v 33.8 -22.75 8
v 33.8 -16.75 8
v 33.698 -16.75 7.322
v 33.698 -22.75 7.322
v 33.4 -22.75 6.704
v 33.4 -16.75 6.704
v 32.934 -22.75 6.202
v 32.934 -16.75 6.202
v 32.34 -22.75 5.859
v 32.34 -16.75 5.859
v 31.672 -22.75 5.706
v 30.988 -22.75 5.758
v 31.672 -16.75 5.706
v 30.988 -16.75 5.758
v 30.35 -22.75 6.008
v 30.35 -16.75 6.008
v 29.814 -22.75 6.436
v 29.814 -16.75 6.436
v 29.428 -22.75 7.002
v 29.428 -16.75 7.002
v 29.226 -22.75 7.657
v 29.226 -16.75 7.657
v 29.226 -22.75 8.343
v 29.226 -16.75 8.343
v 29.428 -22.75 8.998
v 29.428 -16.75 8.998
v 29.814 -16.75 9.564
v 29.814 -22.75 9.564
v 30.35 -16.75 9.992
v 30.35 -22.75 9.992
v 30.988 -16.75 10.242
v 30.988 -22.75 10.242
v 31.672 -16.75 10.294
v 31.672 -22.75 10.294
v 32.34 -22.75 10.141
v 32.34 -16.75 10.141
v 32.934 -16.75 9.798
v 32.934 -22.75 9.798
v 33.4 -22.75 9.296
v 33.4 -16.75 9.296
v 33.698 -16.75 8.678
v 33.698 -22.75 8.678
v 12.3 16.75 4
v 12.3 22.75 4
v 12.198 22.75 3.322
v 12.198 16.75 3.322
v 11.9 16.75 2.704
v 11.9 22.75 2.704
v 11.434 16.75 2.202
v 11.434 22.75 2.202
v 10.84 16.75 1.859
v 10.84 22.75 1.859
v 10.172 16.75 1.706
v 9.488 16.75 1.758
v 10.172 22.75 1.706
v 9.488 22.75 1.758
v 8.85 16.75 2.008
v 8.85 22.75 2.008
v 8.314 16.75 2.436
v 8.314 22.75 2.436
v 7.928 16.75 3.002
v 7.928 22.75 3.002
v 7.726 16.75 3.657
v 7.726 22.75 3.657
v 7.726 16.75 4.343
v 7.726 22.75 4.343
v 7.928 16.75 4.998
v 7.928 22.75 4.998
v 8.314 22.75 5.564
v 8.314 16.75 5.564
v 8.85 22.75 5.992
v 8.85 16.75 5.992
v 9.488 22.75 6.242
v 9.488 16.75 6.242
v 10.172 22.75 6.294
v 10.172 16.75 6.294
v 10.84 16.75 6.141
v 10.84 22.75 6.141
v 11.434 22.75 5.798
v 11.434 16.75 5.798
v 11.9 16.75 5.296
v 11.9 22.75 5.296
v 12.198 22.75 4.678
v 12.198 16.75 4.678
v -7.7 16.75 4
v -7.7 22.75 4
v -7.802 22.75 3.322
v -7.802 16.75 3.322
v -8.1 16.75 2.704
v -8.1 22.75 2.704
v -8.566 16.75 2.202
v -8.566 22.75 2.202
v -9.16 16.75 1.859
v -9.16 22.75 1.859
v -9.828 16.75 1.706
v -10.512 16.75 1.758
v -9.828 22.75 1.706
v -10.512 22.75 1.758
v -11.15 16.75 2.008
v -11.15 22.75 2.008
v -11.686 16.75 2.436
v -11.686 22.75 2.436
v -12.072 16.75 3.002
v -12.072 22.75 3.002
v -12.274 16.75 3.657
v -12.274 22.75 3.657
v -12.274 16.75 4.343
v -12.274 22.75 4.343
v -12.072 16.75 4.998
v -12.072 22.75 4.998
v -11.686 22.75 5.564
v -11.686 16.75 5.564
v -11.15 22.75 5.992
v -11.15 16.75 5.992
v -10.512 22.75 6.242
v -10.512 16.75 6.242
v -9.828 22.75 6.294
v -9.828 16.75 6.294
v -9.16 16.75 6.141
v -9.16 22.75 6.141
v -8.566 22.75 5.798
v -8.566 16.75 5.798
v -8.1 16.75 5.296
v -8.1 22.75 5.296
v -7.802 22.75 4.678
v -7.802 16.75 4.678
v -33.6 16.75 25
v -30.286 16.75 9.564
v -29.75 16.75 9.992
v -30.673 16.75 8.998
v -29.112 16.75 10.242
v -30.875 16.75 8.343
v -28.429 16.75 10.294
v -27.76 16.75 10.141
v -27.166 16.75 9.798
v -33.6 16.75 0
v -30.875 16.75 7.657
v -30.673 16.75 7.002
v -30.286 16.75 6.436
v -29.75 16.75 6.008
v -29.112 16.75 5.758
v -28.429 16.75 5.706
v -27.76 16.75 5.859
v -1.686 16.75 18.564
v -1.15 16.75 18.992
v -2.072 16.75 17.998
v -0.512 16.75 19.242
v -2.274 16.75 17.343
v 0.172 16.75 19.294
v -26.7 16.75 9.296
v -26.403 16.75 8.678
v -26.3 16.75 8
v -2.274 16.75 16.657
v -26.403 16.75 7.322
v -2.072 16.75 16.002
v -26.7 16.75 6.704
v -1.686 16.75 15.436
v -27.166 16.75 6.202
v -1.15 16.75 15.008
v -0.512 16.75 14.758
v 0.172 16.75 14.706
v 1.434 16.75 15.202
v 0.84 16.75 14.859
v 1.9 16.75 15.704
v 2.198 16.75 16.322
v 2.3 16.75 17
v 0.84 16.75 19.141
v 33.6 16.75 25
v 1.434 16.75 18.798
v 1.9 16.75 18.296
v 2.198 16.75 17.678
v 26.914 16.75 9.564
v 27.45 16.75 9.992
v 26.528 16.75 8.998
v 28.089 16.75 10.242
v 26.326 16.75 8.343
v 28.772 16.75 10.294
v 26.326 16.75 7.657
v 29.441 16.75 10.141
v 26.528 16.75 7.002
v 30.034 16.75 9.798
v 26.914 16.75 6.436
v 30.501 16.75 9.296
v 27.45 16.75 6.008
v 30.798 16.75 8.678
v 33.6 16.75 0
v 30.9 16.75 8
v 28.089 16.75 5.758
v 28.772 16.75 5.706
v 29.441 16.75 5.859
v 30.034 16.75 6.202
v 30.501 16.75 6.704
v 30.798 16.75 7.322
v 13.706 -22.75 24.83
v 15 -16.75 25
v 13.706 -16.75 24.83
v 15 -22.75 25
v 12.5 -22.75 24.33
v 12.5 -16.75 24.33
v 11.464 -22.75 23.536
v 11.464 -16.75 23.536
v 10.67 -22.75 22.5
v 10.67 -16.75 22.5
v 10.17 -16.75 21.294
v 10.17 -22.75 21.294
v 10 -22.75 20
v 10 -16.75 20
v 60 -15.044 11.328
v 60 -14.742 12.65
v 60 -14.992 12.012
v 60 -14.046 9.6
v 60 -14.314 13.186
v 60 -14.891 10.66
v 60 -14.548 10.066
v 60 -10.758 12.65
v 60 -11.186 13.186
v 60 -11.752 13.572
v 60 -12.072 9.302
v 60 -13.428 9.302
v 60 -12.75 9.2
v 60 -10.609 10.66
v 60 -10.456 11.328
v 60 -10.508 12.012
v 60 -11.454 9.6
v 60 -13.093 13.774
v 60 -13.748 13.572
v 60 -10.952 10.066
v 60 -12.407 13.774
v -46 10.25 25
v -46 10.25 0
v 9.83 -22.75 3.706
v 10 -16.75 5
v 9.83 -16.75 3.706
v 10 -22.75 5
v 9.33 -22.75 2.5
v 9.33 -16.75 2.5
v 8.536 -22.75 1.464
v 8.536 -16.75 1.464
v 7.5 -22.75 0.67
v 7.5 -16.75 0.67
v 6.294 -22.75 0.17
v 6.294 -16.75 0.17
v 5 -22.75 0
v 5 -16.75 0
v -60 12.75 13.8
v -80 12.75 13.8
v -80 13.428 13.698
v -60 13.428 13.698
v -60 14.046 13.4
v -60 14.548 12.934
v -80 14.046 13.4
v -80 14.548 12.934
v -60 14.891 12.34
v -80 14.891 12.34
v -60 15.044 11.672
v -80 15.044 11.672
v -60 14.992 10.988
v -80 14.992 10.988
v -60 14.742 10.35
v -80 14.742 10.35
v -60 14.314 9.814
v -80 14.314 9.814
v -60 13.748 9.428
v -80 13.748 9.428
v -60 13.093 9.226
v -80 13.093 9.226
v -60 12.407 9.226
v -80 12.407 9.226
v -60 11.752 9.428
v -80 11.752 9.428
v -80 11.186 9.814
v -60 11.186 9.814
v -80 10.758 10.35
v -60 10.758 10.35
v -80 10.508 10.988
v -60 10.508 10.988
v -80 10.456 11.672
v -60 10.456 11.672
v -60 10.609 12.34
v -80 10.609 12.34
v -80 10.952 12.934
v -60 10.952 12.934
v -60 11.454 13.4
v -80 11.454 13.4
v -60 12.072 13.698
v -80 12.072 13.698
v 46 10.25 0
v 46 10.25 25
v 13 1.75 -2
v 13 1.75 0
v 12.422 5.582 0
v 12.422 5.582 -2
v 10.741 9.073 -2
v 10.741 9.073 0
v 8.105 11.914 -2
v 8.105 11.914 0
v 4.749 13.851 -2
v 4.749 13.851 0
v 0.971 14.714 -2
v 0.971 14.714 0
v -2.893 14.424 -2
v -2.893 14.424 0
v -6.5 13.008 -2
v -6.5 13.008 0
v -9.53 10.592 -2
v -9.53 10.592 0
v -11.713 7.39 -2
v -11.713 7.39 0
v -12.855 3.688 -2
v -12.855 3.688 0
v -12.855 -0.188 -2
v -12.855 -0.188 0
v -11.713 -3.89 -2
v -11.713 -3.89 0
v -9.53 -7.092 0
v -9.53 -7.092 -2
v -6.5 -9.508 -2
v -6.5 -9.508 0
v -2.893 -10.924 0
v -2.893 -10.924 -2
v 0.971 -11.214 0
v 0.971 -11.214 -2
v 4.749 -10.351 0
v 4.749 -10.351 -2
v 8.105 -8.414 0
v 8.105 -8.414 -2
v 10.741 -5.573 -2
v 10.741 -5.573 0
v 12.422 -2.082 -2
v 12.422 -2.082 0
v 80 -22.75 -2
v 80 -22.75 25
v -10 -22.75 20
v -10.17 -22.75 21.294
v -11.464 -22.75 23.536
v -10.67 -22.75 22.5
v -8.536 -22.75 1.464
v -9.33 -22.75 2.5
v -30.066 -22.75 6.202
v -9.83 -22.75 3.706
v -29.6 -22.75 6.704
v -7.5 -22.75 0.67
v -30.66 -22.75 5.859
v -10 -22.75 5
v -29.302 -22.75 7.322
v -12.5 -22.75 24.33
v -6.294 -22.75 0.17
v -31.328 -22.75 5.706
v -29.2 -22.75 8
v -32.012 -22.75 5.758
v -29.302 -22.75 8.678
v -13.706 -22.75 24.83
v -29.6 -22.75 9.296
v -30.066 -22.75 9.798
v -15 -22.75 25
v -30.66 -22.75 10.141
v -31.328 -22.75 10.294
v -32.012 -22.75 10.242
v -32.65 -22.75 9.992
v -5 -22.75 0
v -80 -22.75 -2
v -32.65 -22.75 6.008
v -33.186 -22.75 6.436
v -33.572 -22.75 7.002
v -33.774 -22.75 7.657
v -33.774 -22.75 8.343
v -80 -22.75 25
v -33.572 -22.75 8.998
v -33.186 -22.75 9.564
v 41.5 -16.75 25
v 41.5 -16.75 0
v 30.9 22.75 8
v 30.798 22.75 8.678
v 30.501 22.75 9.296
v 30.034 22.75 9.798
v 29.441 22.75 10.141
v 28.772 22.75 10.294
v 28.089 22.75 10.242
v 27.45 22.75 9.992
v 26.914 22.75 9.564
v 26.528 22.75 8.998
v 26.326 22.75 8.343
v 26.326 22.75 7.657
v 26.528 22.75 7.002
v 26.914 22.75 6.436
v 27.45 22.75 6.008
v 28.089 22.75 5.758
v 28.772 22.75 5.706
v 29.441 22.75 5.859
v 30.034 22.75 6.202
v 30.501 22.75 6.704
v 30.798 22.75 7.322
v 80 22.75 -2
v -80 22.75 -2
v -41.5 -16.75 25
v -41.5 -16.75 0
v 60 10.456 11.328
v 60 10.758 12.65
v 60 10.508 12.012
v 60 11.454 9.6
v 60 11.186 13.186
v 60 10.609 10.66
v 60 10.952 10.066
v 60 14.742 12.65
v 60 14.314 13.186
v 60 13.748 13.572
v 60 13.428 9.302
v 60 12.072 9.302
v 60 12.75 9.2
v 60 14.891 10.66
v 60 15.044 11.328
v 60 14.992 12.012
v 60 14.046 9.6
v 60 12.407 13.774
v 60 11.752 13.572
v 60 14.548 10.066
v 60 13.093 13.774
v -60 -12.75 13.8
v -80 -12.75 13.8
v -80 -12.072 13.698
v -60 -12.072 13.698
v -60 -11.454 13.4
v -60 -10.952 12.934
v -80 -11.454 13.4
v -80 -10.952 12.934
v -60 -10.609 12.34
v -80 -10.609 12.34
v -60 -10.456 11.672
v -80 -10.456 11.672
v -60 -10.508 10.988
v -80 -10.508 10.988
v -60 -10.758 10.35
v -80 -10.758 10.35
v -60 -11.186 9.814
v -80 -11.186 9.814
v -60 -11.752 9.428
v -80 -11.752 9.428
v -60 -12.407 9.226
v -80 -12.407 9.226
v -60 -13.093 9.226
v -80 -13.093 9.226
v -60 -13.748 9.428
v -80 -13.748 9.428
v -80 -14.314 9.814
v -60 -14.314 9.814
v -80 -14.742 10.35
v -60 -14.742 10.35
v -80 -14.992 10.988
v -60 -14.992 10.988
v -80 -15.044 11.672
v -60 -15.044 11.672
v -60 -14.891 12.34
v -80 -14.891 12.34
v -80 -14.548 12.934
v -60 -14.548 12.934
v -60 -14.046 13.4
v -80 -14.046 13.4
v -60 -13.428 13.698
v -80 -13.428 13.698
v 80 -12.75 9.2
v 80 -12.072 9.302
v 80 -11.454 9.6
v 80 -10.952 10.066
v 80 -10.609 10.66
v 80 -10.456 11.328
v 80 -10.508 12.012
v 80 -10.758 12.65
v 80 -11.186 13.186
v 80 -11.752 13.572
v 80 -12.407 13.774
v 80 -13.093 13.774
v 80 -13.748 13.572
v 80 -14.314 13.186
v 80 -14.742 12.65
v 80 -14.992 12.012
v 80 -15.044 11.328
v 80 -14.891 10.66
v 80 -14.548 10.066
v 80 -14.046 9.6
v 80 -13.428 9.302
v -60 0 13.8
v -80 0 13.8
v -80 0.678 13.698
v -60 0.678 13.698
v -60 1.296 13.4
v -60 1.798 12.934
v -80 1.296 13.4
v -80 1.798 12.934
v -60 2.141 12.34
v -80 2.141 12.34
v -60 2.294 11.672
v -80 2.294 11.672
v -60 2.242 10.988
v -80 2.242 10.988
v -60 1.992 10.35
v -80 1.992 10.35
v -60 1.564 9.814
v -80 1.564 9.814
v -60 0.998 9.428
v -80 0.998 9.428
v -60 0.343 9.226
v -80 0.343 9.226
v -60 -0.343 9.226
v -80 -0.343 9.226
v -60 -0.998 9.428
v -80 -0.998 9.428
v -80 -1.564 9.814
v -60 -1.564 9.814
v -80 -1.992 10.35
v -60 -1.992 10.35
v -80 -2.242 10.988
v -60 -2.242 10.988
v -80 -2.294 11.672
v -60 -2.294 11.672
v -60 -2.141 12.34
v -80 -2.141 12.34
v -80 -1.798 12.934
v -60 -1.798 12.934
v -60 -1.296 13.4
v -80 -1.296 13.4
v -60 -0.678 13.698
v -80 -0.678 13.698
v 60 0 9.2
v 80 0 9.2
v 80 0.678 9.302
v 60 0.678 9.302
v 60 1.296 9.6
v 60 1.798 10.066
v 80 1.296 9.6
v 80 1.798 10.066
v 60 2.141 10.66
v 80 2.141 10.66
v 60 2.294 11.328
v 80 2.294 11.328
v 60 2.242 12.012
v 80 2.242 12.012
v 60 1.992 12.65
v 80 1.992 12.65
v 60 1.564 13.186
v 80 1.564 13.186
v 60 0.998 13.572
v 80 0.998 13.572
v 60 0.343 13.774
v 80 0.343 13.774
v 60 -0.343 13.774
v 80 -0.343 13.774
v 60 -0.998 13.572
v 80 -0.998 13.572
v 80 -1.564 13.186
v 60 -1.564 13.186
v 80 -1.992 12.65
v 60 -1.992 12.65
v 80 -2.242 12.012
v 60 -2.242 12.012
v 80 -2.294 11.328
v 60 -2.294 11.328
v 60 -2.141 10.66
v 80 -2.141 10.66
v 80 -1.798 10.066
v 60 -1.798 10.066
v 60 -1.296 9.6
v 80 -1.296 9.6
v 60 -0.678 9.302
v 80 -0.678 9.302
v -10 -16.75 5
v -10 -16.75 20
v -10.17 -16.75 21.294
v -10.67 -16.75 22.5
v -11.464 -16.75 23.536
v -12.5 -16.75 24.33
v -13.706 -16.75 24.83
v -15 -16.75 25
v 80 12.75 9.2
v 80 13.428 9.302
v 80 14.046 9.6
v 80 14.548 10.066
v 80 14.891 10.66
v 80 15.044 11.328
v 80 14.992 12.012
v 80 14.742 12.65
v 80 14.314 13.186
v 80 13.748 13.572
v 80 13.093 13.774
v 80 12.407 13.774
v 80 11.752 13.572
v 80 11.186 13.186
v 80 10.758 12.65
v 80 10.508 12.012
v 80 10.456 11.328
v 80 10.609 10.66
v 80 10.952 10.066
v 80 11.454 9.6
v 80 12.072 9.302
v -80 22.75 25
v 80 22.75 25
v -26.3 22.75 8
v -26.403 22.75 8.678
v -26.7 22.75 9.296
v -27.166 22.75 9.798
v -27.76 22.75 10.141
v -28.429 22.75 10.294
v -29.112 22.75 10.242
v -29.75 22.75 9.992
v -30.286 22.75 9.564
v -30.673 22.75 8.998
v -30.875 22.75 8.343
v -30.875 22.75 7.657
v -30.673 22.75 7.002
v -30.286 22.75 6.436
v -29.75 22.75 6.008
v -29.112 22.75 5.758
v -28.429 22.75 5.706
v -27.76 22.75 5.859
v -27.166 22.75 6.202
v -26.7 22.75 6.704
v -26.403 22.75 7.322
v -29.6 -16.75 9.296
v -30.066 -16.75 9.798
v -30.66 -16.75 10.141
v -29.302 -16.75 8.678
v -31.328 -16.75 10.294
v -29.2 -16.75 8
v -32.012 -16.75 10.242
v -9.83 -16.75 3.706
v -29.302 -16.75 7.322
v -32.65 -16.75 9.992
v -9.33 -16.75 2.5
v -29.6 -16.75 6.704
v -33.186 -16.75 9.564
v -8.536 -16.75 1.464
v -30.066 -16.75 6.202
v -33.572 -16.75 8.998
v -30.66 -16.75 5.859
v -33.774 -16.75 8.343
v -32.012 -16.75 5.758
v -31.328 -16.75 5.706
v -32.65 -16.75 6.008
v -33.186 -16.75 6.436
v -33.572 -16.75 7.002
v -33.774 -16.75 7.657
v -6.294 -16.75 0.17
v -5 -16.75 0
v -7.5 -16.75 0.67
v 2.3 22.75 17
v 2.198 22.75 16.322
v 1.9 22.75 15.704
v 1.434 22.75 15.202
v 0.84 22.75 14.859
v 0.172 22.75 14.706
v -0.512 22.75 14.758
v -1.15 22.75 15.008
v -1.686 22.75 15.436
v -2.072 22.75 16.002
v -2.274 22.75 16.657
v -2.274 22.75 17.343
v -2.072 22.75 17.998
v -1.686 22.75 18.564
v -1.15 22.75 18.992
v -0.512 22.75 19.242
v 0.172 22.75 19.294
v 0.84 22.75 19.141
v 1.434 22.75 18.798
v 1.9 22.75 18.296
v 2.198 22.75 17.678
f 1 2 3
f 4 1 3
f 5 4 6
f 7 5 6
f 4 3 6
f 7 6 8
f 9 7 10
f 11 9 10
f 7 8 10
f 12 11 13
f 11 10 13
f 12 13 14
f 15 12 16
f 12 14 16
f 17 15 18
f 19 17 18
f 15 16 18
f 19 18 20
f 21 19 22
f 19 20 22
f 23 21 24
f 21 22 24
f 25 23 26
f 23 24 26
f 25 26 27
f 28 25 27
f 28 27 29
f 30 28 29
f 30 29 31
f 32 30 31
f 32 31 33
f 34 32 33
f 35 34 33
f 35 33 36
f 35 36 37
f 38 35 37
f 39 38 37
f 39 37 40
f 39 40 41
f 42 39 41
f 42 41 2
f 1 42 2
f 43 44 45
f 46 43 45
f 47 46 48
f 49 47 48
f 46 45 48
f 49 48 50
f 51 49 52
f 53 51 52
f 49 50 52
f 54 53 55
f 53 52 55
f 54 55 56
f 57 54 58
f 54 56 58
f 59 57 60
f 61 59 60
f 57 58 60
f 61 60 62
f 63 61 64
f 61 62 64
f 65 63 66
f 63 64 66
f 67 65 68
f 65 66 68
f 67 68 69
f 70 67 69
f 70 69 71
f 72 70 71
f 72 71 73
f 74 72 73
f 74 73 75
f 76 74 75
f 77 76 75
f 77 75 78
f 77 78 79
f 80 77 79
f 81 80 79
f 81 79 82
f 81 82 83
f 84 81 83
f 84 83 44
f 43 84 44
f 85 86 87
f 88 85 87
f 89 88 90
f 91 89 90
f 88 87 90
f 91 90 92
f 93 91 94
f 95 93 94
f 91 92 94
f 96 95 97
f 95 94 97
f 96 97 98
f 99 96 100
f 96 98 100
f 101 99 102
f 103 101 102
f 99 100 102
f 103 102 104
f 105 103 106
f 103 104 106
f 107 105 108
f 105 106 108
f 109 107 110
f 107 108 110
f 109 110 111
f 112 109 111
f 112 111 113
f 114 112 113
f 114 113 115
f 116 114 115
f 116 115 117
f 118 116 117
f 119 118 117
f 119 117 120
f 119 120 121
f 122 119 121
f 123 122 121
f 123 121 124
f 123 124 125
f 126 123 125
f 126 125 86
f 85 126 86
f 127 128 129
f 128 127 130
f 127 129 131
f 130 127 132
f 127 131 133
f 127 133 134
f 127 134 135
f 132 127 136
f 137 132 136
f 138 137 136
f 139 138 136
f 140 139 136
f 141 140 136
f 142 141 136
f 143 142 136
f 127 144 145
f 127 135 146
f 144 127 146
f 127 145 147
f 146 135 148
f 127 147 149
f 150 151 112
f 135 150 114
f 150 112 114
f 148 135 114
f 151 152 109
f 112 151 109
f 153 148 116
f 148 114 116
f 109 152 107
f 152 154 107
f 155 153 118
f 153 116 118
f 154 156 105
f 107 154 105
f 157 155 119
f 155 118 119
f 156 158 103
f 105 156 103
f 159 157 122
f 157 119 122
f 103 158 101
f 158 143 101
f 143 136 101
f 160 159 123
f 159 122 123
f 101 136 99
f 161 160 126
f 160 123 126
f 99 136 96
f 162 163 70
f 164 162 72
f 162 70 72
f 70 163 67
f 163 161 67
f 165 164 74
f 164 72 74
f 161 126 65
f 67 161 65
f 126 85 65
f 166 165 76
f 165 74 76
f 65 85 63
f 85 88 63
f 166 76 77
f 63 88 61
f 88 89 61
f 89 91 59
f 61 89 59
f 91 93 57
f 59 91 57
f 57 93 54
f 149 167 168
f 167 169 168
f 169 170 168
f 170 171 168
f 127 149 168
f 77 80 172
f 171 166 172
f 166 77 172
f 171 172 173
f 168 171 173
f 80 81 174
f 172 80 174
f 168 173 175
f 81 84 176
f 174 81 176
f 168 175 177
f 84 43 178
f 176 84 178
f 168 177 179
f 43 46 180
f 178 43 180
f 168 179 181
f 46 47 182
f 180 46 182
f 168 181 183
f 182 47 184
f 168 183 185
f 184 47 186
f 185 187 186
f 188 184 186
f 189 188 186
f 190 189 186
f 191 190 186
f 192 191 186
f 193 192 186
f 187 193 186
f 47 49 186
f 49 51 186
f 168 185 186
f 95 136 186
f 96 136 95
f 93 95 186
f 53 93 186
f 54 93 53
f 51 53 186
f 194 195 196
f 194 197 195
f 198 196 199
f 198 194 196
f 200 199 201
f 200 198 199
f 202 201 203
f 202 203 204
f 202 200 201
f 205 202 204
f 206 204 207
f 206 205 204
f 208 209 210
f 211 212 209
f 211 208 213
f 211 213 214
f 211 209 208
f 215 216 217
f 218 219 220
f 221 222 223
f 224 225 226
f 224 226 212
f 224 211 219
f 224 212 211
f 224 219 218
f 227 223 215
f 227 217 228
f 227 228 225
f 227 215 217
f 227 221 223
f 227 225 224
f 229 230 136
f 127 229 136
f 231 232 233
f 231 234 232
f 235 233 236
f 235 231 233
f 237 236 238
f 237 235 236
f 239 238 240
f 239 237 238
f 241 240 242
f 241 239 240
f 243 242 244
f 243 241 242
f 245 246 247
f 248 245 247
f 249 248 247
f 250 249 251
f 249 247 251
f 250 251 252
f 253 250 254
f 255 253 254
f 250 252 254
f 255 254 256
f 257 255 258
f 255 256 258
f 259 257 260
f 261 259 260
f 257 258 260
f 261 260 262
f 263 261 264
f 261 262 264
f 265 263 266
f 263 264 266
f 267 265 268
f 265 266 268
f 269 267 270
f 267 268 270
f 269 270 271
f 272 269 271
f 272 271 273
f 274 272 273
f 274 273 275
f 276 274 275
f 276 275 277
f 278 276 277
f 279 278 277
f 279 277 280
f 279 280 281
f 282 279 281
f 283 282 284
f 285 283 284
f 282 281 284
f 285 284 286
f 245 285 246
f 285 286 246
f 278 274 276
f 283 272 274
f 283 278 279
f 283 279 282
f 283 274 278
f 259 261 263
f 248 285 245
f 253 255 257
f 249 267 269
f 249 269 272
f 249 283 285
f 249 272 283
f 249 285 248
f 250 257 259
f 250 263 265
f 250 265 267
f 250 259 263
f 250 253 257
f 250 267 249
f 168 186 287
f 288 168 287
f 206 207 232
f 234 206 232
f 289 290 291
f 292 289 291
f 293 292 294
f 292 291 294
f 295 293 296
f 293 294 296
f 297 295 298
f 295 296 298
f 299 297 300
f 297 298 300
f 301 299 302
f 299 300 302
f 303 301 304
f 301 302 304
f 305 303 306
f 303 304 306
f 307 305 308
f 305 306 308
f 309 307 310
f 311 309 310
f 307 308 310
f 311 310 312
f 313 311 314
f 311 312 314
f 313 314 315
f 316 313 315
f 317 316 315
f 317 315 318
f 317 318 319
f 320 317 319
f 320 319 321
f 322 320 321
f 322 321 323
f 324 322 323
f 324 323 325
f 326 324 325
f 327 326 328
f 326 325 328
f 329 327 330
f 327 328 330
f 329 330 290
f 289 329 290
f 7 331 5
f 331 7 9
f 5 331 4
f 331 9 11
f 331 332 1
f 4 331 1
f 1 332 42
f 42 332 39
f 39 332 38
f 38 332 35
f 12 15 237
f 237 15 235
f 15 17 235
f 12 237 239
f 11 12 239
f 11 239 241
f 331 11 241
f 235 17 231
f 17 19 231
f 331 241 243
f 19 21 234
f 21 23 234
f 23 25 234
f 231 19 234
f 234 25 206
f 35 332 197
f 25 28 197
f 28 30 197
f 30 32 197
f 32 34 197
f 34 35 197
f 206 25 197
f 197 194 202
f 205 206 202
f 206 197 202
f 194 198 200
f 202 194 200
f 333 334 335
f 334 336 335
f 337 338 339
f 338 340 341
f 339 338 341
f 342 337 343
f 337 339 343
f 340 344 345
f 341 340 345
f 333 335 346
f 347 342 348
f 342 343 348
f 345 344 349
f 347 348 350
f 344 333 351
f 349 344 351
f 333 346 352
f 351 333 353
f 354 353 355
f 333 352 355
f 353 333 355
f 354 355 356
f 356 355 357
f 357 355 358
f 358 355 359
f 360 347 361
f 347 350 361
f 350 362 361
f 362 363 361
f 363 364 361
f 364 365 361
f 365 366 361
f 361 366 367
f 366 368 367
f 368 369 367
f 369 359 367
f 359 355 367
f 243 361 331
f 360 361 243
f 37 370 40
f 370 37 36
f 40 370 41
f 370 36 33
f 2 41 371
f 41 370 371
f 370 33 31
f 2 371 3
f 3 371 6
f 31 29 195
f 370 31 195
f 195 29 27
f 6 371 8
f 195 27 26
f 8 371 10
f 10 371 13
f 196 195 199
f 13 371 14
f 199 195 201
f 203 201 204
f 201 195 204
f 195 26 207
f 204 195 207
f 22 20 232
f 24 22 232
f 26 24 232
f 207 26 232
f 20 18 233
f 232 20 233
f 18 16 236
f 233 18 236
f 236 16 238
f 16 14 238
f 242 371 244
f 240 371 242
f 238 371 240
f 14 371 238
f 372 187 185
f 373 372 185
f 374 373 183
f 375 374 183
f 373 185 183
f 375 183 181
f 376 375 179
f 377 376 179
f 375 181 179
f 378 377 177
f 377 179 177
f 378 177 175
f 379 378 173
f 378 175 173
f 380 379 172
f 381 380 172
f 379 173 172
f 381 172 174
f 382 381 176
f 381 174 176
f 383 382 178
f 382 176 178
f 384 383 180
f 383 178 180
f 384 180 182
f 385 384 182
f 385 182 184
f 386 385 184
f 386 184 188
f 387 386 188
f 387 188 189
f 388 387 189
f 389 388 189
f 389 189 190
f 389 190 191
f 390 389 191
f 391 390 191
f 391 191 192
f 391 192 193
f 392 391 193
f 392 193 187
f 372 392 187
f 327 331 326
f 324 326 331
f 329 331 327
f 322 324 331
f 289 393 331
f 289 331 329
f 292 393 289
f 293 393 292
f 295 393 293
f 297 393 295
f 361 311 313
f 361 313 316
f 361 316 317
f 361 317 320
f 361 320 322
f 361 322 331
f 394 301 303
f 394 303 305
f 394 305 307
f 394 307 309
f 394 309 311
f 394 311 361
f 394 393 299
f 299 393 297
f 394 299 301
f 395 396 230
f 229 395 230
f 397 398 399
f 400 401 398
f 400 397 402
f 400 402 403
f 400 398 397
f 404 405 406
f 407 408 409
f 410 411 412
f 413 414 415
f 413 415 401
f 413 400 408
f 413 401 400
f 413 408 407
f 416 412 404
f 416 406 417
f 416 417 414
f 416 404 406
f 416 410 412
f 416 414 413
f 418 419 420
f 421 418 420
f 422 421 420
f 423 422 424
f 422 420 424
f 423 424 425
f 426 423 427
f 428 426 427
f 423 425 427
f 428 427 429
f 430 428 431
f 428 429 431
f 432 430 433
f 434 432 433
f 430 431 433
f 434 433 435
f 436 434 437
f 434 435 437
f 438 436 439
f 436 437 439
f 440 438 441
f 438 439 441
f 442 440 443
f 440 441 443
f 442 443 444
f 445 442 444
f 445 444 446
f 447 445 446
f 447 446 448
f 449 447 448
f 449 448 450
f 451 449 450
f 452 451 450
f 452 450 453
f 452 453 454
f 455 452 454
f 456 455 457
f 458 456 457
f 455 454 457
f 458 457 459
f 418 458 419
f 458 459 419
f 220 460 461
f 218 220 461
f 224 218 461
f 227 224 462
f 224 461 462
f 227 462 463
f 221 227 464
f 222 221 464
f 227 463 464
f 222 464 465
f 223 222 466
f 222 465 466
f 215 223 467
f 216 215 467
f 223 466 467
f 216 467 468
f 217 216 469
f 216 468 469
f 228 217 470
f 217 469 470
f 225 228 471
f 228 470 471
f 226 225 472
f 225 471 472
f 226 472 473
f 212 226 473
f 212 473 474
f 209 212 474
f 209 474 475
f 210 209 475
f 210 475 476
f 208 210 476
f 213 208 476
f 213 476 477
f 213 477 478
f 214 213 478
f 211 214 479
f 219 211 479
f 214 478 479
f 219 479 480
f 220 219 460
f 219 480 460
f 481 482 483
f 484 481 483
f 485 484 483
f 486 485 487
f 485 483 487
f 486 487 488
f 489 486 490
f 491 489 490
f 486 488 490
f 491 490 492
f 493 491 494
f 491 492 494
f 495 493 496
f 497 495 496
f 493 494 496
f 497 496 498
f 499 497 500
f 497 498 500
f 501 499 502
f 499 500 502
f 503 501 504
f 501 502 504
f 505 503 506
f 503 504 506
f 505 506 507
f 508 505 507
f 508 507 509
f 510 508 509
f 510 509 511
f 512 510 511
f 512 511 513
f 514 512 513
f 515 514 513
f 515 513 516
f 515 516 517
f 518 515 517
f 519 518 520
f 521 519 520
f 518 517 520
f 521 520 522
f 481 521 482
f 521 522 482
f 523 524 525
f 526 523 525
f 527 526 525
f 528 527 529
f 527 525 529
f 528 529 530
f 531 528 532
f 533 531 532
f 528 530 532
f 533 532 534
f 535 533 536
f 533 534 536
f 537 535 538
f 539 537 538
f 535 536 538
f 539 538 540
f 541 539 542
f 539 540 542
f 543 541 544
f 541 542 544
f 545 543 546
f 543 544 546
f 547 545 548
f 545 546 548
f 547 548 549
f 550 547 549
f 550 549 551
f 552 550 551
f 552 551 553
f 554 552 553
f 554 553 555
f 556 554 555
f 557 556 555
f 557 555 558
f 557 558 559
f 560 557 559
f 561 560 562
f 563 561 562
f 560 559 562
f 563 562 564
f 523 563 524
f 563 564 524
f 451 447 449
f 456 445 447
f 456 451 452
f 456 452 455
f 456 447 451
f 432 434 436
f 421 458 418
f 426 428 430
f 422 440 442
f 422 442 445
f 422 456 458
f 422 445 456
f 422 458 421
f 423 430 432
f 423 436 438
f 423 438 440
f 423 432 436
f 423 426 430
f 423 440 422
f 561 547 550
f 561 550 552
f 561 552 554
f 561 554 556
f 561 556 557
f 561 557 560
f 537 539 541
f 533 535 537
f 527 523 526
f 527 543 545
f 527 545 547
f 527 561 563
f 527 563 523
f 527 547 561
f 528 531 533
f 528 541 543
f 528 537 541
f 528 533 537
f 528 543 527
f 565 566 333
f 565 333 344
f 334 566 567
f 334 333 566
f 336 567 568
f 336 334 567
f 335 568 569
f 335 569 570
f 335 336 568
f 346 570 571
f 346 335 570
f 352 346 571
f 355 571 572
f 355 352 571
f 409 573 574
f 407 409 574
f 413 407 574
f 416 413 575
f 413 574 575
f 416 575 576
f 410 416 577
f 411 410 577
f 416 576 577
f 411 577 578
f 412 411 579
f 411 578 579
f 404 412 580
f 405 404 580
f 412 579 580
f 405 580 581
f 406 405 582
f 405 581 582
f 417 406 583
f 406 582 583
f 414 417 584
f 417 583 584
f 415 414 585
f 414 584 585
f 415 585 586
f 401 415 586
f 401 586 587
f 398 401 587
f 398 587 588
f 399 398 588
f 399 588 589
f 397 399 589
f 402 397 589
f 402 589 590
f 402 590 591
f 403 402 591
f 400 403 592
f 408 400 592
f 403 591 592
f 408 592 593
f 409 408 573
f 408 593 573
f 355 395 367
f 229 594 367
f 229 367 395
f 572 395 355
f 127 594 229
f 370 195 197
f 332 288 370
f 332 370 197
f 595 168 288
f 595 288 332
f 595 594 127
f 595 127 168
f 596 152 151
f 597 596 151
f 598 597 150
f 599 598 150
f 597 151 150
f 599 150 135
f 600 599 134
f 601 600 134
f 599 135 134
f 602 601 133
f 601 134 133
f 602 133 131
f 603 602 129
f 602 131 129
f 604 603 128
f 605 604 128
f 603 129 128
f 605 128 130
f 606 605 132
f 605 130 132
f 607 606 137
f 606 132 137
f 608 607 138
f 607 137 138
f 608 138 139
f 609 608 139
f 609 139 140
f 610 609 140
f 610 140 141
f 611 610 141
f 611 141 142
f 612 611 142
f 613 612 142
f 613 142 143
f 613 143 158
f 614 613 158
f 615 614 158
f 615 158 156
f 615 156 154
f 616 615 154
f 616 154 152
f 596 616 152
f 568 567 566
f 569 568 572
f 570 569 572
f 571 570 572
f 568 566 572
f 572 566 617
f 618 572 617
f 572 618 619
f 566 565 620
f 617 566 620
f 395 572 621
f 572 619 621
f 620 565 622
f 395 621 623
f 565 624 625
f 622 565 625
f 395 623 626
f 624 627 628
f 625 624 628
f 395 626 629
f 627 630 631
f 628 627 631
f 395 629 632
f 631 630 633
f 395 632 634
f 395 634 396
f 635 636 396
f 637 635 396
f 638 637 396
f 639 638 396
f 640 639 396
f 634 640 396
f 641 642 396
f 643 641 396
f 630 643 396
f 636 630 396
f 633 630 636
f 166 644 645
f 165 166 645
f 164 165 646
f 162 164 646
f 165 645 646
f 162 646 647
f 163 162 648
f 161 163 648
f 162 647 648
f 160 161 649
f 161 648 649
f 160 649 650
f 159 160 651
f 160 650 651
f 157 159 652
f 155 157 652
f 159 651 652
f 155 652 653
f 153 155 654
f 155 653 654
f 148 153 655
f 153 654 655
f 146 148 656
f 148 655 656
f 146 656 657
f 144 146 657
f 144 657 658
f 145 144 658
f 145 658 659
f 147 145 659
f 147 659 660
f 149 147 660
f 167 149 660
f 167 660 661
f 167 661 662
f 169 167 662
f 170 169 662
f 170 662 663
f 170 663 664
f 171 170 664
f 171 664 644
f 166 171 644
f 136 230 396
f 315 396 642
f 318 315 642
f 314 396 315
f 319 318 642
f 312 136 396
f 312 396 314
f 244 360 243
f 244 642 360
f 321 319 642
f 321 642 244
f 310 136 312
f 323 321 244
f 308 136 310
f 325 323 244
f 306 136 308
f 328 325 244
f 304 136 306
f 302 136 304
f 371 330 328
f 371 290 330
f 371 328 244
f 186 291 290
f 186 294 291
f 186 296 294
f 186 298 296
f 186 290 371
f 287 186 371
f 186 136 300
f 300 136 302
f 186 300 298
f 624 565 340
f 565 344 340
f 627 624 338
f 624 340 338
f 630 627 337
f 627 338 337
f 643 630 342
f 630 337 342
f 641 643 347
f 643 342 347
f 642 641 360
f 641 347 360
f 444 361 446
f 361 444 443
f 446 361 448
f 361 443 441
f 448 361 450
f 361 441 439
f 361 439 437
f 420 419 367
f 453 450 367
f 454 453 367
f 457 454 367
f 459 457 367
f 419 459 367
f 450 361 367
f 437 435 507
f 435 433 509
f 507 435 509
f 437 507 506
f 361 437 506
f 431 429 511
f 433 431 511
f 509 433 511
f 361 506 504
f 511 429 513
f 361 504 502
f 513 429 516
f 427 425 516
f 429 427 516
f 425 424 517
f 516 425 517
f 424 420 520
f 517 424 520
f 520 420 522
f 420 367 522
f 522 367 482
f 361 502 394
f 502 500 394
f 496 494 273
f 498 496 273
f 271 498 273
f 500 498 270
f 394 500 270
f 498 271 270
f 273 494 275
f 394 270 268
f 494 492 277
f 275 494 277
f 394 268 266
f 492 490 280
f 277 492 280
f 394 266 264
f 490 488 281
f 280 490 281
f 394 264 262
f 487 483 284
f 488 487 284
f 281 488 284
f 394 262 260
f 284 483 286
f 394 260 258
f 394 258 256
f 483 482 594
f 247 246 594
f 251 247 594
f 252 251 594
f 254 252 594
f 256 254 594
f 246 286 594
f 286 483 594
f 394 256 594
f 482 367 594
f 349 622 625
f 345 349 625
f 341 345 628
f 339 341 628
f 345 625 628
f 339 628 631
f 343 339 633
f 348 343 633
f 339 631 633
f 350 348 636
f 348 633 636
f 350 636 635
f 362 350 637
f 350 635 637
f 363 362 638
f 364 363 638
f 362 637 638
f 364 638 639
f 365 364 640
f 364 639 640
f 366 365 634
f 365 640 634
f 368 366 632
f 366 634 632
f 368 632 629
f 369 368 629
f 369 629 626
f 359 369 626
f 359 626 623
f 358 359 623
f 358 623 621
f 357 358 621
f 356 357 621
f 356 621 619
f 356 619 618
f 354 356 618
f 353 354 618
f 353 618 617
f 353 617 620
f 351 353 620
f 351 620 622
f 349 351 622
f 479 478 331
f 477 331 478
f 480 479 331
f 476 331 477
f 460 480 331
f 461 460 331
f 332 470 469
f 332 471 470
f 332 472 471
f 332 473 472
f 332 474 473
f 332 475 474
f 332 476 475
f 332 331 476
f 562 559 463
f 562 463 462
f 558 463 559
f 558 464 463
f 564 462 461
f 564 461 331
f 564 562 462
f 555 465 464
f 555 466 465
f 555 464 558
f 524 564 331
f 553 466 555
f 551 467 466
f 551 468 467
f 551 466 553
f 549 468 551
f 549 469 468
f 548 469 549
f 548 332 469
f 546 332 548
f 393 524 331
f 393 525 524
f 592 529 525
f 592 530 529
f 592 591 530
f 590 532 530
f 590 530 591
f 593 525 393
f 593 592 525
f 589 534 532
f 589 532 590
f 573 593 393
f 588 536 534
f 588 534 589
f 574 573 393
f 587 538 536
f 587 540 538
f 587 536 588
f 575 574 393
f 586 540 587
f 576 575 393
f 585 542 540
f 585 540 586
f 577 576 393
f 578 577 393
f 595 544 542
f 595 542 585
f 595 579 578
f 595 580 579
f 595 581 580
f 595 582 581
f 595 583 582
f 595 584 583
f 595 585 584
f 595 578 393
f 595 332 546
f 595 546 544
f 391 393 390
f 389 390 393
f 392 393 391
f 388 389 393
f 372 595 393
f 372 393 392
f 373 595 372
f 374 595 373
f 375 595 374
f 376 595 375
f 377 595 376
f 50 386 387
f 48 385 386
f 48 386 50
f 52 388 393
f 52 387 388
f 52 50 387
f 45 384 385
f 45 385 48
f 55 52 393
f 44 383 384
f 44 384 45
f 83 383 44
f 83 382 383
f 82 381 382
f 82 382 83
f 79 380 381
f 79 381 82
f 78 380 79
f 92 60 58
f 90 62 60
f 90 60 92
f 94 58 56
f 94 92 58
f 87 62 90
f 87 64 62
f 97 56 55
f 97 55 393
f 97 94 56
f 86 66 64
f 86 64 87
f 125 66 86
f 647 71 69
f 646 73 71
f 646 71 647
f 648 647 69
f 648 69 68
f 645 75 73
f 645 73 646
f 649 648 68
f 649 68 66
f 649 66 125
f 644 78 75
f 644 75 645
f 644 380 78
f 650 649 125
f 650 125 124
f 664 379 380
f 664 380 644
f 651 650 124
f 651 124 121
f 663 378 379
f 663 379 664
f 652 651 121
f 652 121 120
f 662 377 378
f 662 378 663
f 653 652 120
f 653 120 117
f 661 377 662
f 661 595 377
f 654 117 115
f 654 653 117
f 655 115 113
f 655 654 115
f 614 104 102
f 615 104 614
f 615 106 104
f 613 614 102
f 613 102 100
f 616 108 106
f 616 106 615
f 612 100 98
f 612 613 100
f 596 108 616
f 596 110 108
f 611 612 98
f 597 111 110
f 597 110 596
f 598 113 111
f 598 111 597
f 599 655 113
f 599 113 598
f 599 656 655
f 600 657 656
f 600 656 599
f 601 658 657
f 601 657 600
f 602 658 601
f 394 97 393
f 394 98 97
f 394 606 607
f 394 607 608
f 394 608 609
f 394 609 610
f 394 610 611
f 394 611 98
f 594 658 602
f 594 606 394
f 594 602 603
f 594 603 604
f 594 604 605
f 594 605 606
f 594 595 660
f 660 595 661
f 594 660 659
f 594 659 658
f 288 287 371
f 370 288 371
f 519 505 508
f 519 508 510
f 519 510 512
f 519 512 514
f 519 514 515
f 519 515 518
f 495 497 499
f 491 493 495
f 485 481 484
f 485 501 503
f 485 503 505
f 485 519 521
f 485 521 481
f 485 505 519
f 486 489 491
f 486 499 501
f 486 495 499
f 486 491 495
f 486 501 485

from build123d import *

# Parameters (mm, degrees)
CROQUIS1_W              = 160
CROQUIS1_H              = 45.5
SALIENTE_EXTRUIR1_DEPTH = 25
CROQUIS2_W              = 160
CROQUIS2_H              = 45.5
SALIENTE_EXTRUIR2_DEPTH = 2
CROQUIS5_R              = 13
CORTAR_EXTRUIR3_DEPTH   = 2
CORTAR_EXTRUIR4_REACH   = 8
CROQUIS6_W              = 20
CROQUIS6_H              = 25
REDONDEO1_R             = 5
REDONDEO2_R             = 5
CORTAR_EXTRUIR5_REACH   = 8
CROQUIS7_R              = 2.3
CORTAR_EXTRUIR6_REACH   = 8
CROQUIS8_R              = 2.3
CORTAR_EXTRUIR7_REACH   = 47.5
CROQUIS9_R              = 2.3
CROQUIS10_R             = 2.3
CORTAR_EXTRUIR8_DEPTH   = 20
CROQUIS11_R             = 2.3
CORTAR_EXTRUIR9_DEPTH   = 20


with BuildPart() as part:
    # Croquis1 → Saliente-Extruir1 (new body)
    with BuildSketch(Plane.XY):
        Rectangle(CROQUIS1_W, CROQUIS1_H)
        Polygon((-33.600403232, 16.75), (33.600403232, 16.75), (46, 10.25), (41.5, -16.75), (-41.5, -16.75), (-46, 10.25), align=None, mode=Mode.SUBTRACT)
    extrude(amount=SALIENTE_EXTRUIR1_DEPTH)

    # Croquis2 → Saliente-Extruir2 (add)
    with BuildSketch(Plane(origin=(0, 0, 0), x_dir=(-1, 0, 0), z_dir=(0, 0, -1))):
        Rectangle(CROQUIS2_W, CROQUIS2_H)
    extrude(amount=SALIENTE_EXTRUIR2_DEPTH)

    # Croquis5 → Cortar-Extruir3 (cut)
    with BuildSketch(Plane.XY):
        with Locations((0, 1.75)):
            Circle(CROQUIS5_R)
    extrude(amount=-CORTAR_EXTRUIR3_DEPTH, mode=Mode.SUBTRACT)

    # Croquis6 → Cortar-Extruir4 (cut, up to next)
    with BuildSketch(Plane(origin=(0, -16.75, 0), x_dir=(1, 0, 0), z_dir=(0, 1, 0)), mode=Mode.PRIVATE) as cortar_extruir4_sk1:
        with Locations((0, -12.5)):
            Rectangle(CROQUIS6_W, CROQUIS6_H)
    cortar_extruir4_tool1 = extrude(cortar_extruir4_sk1.sketch, amount=-CORTAR_EXTRUIR4_REACH, mode=Mode.PRIVATE) & part.part
    add(cortar_extruir4_tool1.solids().sort_by_distance((0, -16.75, 12.5))[0], mode=Mode.SUBTRACT)

    # Redondeo1
    redondeo1_edges = [part.edges().sort_by_distance(p)[0] for p in [
        (-10, -19.75, 0),
        (10, -19.75, 0),
    ]]
    fillet(redondeo1_edges, radius=REDONDEO1_R)

    # Redondeo2
    redondeo2_edges = [part.edges().sort_by_distance(p)[0] for p in [
        (-10, -19.75, 25),
        (10, -19.75, 25),
    ]]
    fillet(redondeo2_edges, radius=REDONDEO2_R)

    # Croquis7 → Cortar-Extruir5 (cut, up to next)
    with BuildSketch(Plane(origin=(0, -16.75, 0), x_dir=(1, 0, 0), z_dir=(0, 1, 0)), mode=Mode.PRIVATE) as cortar_extruir5_sk1:
        with Locations((-31.5, -8)):
            Circle(CROQUIS7_R)
    cortar_extruir5_tool1 = extrude(cortar_extruir5_sk1.sketch, amount=-CORTAR_EXTRUIR5_REACH, mode=Mode.PRIVATE) & part.part
    add(cortar_extruir5_tool1.solids().sort_by_distance((-31.5, -16.75, 8))[0], mode=Mode.SUBTRACT)
    # Croquis7 → Cortar-Extruir5 (cut, up to next)
    with BuildSketch(Plane(origin=(0, -16.75, 0), x_dir=(1, 0, 0), z_dir=(0, 1, 0)), mode=Mode.PRIVATE) as cortar_extruir5_sk2:
        with Locations((31.5, -8)):
            Circle(CROQUIS7_R)
    cortar_extruir5_tool2 = extrude(cortar_extruir5_sk2.sketch, amount=-CORTAR_EXTRUIR5_REACH, mode=Mode.PRIVATE) & part.part
    add(cortar_extruir5_tool2.solids().sort_by_distance((31.5, -16.75, 8))[0], mode=Mode.SUBTRACT)

    # Croquis8 → Cortar-Extruir6 (cut, up to next)
    with BuildSketch(Plane.XZ.offset(-16.75), mode=Mode.PRIVATE) as cortar_extruir6_sk1:
        with Locations((-28.600403232, 8)):
            Circle(CROQUIS8_R)
    cortar_extruir6_tool1 = extrude(cortar_extruir6_sk1.sketch, amount=-CORTAR_EXTRUIR6_REACH, mode=Mode.PRIVATE) & part.part
    add(cortar_extruir6_tool1.solids().sort_by_distance((-28.600403, 16.75, 8))[0], mode=Mode.SUBTRACT)
    # Croquis8 → Cortar-Extruir6 (cut, up to next)
    with BuildSketch(Plane.XZ.offset(-16.75), mode=Mode.PRIVATE) as cortar_extruir6_sk2:
        with Locations((28.600403232, 8)):
            Circle(CROQUIS8_R)
    cortar_extruir6_tool2 = extrude(cortar_extruir6_sk2.sketch, amount=-CORTAR_EXTRUIR6_REACH, mode=Mode.PRIVATE) & part.part
    add(cortar_extruir6_tool2.solids().sort_by_distance((28.600403, 16.75, 8))[0], mode=Mode.SUBTRACT)

    # Croquis9 → Cortar-Extruir7 (cut, up to next)
    with BuildSketch(Plane(origin=(0, 22.75, 0), x_dir=(1, 0, 0), z_dir=(0, 1, 0)), mode=Mode.PRIVATE) as cortar_extruir7_sk1:
        with Locations((-10, -4)):
            Circle(CROQUIS9_R)
    cortar_extruir7_tool1 = extrude(cortar_extruir7_sk1.sketch, amount=-CORTAR_EXTRUIR7_REACH, mode=Mode.PRIVATE) & part.part
    add(cortar_extruir7_tool1.solids().sort_by_distance((-10, 22.75, 4))[0], mode=Mode.SUBTRACT)
    # Croquis9 → Cortar-Extruir7 (cut, up to next)
    with BuildSketch(Plane(origin=(0, 22.75, 0), x_dir=(1, 0, 0), z_dir=(0, 1, 0)), mode=Mode.PRIVATE) as cortar_extruir7_sk2:
        with Locations((10, -4)):
            Circle(CROQUIS9_R)
    cortar_extruir7_tool2 = extrude(cortar_extruir7_sk2.sketch, amount=-CORTAR_EXTRUIR7_REACH, mode=Mode.PRIVATE) & part.part
    add(cortar_extruir7_tool2.solids().sort_by_distance((10, 22.75, 4))[0], mode=Mode.SUBTRACT)
    # Croquis9 → Cortar-Extruir7 (cut, up to next)
    with BuildSketch(Plane(origin=(0, 22.75, 0), x_dir=(1, 0, 0), z_dir=(0, 1, 0)), mode=Mode.PRIVATE) as cortar_extruir7_sk3:
        with Locations((0, -17)):
            Circle(CROQUIS9_R)
    cortar_extruir7_tool3 = extrude(cortar_extruir7_sk3.sketch, amount=-CORTAR_EXTRUIR7_REACH, mode=Mode.PRIVATE) & part.part
    add(cortar_extruir7_tool3.solids().sort_by_distance((0, 22.75, 17))[0], mode=Mode.SUBTRACT)

    # Croquis10 → Cortar-Extruir8 (cut)
    with BuildSketch(Plane.ZY.offset(80)):
        with Locations((11.5, 0)):
            Circle(CROQUIS10_R)
        with Locations((11.5, -12.75)):
            Circle(CROQUIS10_R)
        with Locations((11.5, 12.75)):
            Circle(CROQUIS10_R)
    extrude(amount=-CORTAR_EXTRUIR8_DEPTH, mode=Mode.SUBTRACT)

    # Croquis11 → Cortar-Extruir9 (cut)
    with BuildSketch(Plane(origin=(80, 0, 0), x_dir=(0, 0, -1), z_dir=(1, 0, 0))):
        with Locations((-11.5, 12.75)):
            Circle(CROQUIS11_R)
        with Locations((-11.5, 0)):
            Circle(CROQUIS11_R)
        with Locations((-11.5, -12.75)):
            Circle(CROQUIS11_R)
    extrude(amount=-CORTAR_EXTRUIR9_DEPTH, mode=Mode.SUBTRACT)


solid = part.part
